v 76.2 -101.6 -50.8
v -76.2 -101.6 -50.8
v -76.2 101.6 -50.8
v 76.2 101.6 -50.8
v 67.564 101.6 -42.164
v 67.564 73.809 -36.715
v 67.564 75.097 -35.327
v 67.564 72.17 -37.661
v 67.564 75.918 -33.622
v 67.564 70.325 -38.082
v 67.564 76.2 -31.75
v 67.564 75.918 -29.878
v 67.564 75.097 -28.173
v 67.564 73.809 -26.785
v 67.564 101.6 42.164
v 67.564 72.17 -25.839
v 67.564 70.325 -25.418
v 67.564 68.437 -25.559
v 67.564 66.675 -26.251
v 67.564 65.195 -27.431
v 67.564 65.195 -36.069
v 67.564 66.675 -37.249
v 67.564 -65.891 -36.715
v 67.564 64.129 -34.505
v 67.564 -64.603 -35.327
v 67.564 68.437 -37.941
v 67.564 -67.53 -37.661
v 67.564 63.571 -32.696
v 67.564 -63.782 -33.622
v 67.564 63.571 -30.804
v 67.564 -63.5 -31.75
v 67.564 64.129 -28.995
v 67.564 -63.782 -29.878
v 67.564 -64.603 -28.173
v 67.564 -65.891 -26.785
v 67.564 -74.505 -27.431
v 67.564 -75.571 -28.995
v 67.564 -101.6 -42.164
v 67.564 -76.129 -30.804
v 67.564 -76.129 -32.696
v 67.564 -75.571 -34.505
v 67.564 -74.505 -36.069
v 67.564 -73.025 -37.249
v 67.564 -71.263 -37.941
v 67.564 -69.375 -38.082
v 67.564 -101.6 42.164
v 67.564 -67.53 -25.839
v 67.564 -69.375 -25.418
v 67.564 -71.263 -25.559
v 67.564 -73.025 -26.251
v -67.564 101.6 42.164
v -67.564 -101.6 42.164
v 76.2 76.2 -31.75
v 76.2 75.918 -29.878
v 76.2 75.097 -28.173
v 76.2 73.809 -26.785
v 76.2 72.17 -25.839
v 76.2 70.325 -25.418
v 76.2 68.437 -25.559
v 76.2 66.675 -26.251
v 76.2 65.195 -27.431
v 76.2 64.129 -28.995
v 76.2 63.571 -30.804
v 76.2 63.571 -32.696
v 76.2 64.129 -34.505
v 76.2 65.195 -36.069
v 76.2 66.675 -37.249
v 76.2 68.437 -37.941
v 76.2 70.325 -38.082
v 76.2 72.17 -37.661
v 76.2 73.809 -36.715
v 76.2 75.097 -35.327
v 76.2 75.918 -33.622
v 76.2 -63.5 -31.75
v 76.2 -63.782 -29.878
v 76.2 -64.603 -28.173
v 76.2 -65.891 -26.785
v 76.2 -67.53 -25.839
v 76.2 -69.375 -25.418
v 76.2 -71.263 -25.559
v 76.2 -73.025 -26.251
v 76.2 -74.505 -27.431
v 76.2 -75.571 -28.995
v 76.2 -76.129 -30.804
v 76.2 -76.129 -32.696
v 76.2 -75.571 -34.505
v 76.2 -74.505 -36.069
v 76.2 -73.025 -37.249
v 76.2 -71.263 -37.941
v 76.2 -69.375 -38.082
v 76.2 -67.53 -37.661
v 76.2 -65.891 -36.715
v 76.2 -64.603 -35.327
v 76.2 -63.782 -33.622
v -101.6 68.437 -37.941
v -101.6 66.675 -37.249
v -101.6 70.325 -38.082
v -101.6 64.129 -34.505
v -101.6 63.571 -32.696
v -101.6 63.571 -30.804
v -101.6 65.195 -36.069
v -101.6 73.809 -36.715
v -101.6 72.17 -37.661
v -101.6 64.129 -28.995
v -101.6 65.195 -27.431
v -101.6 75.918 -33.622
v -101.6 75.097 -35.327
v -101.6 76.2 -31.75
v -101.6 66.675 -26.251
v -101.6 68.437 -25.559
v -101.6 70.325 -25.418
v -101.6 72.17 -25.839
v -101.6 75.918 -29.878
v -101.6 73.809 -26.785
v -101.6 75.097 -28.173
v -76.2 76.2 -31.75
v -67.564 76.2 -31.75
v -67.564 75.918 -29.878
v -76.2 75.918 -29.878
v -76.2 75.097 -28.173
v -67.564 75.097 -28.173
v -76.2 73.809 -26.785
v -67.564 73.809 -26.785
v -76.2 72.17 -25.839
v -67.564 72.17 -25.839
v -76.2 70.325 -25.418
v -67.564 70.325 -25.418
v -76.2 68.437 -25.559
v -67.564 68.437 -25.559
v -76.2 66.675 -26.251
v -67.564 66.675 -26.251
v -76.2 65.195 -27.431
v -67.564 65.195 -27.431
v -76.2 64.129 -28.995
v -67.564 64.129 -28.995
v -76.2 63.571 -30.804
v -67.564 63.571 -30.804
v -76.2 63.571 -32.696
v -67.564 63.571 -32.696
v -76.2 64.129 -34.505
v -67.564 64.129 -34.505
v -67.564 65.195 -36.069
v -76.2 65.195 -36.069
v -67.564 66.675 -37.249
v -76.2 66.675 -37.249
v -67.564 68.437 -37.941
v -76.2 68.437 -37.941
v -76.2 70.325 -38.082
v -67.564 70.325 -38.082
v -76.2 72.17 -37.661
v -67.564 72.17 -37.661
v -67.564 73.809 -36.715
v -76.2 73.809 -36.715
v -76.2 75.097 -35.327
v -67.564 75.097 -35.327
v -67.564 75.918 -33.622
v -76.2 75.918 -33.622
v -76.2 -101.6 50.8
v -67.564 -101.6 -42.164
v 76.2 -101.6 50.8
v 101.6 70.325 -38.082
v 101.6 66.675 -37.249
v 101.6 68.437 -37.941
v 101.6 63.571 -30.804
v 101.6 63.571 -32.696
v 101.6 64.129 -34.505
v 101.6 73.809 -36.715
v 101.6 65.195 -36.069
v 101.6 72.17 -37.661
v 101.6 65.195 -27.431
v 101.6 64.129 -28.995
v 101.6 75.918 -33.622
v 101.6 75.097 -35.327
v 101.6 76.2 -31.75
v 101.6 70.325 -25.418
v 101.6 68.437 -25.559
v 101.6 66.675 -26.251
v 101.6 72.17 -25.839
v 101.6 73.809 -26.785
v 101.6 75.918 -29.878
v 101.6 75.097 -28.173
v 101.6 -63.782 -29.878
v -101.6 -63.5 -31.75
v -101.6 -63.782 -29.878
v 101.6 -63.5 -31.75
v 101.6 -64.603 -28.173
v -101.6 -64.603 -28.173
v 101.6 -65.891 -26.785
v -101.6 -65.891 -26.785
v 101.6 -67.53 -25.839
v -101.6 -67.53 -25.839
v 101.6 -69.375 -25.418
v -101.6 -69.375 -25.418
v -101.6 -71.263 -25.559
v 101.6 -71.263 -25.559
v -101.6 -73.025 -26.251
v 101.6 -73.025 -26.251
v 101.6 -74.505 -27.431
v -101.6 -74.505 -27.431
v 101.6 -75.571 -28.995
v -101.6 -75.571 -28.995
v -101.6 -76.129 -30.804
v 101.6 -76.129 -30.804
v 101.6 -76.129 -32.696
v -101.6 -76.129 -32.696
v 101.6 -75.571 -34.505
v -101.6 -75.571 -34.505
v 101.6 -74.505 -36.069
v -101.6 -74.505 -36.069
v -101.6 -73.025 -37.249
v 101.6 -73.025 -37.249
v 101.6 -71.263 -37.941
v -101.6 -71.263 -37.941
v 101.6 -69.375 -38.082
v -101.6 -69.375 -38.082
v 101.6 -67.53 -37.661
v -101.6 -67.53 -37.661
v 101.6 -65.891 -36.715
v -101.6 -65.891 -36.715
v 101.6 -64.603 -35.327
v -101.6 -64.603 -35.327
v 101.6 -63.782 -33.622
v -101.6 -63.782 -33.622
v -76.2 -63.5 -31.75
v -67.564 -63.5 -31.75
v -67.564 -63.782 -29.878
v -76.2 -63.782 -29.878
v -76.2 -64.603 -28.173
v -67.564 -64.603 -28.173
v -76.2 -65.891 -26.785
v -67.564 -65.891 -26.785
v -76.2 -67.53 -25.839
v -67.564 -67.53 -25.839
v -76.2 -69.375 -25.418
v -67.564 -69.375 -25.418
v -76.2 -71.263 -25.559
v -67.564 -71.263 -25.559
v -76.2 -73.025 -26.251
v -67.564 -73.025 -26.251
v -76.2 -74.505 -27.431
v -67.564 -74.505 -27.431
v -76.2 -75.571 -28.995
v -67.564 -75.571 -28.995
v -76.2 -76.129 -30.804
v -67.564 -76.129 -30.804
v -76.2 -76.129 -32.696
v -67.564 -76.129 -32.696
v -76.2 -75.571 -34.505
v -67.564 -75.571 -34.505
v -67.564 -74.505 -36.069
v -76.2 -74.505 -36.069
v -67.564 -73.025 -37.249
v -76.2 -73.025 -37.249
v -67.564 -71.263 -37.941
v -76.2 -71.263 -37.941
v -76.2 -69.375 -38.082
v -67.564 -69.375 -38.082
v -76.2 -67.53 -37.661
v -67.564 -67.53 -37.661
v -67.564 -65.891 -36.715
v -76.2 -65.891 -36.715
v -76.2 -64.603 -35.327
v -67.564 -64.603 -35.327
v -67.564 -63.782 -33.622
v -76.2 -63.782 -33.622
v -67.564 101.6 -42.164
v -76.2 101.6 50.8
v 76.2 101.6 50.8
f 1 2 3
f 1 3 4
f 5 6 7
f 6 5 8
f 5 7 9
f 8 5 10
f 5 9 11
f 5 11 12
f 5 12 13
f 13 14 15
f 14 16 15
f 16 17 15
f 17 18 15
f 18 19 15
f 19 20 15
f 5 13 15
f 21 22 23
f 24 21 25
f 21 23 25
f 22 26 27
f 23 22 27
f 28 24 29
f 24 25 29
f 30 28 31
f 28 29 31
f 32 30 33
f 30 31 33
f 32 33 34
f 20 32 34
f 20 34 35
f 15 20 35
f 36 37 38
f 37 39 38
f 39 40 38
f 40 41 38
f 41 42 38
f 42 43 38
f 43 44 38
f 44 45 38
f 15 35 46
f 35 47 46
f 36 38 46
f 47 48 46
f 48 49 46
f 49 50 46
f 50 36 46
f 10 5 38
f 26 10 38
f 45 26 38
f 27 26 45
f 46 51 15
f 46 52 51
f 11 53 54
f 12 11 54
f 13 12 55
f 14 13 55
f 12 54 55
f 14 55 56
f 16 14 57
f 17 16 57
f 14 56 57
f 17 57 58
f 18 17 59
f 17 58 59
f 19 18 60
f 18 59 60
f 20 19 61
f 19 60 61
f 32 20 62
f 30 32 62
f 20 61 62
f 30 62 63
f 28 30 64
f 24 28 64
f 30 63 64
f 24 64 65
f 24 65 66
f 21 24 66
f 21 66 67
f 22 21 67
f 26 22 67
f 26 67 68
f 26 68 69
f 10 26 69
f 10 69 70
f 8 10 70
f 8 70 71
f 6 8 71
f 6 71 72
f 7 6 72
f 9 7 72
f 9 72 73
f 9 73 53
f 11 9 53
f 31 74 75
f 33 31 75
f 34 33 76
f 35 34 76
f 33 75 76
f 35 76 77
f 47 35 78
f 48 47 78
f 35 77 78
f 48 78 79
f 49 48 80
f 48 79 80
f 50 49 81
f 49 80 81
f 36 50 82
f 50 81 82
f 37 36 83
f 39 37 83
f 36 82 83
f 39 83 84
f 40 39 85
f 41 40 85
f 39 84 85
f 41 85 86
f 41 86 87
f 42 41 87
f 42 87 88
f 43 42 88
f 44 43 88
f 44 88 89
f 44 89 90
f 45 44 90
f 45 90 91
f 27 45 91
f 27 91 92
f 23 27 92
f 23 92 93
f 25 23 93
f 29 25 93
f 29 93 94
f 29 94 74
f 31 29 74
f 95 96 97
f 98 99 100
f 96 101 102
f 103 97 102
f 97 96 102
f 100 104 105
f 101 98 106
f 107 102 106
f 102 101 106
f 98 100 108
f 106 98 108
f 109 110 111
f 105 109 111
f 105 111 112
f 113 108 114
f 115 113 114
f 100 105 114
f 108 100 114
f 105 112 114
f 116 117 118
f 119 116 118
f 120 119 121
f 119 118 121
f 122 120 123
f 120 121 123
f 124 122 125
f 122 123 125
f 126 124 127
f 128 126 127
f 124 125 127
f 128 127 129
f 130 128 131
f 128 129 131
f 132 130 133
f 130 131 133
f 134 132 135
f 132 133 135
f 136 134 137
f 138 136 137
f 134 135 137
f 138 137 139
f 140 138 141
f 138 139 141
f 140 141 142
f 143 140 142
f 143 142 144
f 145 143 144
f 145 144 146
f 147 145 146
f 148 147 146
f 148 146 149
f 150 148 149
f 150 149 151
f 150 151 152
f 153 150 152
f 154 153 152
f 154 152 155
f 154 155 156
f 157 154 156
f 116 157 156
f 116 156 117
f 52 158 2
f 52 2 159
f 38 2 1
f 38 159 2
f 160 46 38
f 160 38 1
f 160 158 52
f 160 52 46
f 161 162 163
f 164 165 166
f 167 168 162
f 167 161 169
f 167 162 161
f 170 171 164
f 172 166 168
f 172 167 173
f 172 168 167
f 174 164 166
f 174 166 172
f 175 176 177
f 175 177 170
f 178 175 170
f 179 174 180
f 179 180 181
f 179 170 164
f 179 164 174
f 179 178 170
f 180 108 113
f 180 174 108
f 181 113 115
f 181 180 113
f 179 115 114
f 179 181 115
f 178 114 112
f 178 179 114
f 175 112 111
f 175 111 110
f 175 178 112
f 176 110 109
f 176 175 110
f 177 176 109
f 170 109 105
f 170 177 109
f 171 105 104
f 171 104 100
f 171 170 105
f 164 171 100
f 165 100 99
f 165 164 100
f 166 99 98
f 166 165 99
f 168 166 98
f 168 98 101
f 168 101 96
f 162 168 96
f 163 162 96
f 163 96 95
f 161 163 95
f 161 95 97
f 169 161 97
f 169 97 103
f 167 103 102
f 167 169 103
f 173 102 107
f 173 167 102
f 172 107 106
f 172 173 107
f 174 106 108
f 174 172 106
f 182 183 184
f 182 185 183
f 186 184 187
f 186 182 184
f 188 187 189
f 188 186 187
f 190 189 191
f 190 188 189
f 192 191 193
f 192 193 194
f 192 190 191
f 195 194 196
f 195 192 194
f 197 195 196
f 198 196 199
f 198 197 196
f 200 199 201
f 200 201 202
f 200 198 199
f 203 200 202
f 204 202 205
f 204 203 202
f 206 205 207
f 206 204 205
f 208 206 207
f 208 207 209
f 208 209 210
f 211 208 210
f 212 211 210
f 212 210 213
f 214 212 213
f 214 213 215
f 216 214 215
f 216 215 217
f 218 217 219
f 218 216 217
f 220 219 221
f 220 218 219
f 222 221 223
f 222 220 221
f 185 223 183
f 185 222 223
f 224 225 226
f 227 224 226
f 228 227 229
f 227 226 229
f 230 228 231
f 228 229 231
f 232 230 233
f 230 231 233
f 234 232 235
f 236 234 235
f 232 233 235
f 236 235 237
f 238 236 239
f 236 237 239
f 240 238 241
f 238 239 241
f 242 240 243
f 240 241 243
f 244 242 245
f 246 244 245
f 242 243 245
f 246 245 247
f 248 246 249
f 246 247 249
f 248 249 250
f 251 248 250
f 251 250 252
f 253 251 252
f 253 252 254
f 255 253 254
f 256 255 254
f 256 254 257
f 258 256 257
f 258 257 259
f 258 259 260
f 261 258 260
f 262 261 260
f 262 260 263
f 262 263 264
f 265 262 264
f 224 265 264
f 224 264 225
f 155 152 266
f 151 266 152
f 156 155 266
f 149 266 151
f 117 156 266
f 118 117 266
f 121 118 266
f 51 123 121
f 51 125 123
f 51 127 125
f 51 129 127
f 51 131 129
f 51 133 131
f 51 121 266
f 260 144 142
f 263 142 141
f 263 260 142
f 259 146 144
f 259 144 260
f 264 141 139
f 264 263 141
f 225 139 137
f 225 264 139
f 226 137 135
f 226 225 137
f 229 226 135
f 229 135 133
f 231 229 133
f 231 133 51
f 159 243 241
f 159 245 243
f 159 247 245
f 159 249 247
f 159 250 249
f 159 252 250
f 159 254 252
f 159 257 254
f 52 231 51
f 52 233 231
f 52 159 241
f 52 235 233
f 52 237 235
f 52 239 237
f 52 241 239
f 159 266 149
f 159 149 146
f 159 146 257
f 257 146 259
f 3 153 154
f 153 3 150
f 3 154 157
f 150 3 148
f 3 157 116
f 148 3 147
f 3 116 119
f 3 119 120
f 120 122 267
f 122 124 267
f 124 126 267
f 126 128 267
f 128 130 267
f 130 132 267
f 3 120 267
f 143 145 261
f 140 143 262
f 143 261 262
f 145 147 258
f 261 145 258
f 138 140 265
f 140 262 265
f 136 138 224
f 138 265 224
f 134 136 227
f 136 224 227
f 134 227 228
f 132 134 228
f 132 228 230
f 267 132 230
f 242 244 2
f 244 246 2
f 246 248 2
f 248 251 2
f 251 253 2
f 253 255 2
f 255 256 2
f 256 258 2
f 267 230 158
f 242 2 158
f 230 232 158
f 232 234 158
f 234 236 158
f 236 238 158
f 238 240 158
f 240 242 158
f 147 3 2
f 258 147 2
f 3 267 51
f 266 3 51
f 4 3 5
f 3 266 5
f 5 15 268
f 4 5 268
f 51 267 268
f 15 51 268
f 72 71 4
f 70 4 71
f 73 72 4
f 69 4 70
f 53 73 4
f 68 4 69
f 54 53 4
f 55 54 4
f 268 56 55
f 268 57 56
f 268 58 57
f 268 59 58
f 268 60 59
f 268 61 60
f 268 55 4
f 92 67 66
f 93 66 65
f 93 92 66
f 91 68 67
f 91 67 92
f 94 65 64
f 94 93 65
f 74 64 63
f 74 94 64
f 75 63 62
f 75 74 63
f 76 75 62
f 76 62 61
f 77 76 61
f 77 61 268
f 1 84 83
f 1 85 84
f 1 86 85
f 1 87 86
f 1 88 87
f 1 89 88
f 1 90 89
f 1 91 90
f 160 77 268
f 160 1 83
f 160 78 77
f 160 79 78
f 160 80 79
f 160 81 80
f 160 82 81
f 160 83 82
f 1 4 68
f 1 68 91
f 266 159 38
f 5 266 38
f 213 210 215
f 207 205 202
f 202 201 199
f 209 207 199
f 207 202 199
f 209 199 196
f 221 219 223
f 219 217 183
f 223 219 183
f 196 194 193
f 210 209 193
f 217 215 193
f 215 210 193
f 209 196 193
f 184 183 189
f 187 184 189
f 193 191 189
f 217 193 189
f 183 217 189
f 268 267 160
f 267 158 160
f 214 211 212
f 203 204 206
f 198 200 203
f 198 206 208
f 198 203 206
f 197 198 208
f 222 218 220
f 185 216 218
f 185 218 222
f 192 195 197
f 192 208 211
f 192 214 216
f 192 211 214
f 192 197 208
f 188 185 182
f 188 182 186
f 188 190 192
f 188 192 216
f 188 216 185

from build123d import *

# Parameters (mm, degrees)
F0_W     = 152.4
F0_H     = 101.6
F0_W_2   = 135.128
F0_H_2   = 84.328
F1_DEPTH = 101.6
F2_R     = 6.35
F3_DEPTH = 152.401
F4_R     = 6.35
F5_DEPTH = 101.6


with BuildPart() as f1:
    # F0 (on Front) → F1 (new body, symmetric)
    with BuildSketch(Plane.XZ):
        Rectangle(F0_W, F0_H)
        Rectangle(F0_W_2, F0_H_2, mode=Mode.SUBTRACT)
    extrude(amount=F1_DEPTH, both=True)

    # F2 (on face) → F3 (cut, through all)
    with BuildSketch(Plane.YZ.offset(76.2)):
        with Locations((-69.85, -31.75)):
            Circle(F2_R)
        with Locations((69.85, -31.75)):
            Circle(F2_R)
    extrude(amount=-F3_DEPTH, mode=Mode.SUBTRACT)


with BuildPart() as f5:
    # F4 (on Right) → F5 (new body, symmetric)
    with BuildSketch(Plane.YZ):
        with Locations((-69.85, -31.75)):
            Circle(F4_R)
    extrude(amount=F5_DEPTH, both=True)


with BuildPart() as f5b:
    # F4 (on Right) → F5, piece 2 (new body, symmetric)
    with BuildSketch(Plane.YZ):
        with Locations((69.85, -31.75)):
            Circle(F4_R)
    extrude(amount=F5_DEPTH, both=True)


solid = Compound([f1.part, f5.part, f5b.part])
